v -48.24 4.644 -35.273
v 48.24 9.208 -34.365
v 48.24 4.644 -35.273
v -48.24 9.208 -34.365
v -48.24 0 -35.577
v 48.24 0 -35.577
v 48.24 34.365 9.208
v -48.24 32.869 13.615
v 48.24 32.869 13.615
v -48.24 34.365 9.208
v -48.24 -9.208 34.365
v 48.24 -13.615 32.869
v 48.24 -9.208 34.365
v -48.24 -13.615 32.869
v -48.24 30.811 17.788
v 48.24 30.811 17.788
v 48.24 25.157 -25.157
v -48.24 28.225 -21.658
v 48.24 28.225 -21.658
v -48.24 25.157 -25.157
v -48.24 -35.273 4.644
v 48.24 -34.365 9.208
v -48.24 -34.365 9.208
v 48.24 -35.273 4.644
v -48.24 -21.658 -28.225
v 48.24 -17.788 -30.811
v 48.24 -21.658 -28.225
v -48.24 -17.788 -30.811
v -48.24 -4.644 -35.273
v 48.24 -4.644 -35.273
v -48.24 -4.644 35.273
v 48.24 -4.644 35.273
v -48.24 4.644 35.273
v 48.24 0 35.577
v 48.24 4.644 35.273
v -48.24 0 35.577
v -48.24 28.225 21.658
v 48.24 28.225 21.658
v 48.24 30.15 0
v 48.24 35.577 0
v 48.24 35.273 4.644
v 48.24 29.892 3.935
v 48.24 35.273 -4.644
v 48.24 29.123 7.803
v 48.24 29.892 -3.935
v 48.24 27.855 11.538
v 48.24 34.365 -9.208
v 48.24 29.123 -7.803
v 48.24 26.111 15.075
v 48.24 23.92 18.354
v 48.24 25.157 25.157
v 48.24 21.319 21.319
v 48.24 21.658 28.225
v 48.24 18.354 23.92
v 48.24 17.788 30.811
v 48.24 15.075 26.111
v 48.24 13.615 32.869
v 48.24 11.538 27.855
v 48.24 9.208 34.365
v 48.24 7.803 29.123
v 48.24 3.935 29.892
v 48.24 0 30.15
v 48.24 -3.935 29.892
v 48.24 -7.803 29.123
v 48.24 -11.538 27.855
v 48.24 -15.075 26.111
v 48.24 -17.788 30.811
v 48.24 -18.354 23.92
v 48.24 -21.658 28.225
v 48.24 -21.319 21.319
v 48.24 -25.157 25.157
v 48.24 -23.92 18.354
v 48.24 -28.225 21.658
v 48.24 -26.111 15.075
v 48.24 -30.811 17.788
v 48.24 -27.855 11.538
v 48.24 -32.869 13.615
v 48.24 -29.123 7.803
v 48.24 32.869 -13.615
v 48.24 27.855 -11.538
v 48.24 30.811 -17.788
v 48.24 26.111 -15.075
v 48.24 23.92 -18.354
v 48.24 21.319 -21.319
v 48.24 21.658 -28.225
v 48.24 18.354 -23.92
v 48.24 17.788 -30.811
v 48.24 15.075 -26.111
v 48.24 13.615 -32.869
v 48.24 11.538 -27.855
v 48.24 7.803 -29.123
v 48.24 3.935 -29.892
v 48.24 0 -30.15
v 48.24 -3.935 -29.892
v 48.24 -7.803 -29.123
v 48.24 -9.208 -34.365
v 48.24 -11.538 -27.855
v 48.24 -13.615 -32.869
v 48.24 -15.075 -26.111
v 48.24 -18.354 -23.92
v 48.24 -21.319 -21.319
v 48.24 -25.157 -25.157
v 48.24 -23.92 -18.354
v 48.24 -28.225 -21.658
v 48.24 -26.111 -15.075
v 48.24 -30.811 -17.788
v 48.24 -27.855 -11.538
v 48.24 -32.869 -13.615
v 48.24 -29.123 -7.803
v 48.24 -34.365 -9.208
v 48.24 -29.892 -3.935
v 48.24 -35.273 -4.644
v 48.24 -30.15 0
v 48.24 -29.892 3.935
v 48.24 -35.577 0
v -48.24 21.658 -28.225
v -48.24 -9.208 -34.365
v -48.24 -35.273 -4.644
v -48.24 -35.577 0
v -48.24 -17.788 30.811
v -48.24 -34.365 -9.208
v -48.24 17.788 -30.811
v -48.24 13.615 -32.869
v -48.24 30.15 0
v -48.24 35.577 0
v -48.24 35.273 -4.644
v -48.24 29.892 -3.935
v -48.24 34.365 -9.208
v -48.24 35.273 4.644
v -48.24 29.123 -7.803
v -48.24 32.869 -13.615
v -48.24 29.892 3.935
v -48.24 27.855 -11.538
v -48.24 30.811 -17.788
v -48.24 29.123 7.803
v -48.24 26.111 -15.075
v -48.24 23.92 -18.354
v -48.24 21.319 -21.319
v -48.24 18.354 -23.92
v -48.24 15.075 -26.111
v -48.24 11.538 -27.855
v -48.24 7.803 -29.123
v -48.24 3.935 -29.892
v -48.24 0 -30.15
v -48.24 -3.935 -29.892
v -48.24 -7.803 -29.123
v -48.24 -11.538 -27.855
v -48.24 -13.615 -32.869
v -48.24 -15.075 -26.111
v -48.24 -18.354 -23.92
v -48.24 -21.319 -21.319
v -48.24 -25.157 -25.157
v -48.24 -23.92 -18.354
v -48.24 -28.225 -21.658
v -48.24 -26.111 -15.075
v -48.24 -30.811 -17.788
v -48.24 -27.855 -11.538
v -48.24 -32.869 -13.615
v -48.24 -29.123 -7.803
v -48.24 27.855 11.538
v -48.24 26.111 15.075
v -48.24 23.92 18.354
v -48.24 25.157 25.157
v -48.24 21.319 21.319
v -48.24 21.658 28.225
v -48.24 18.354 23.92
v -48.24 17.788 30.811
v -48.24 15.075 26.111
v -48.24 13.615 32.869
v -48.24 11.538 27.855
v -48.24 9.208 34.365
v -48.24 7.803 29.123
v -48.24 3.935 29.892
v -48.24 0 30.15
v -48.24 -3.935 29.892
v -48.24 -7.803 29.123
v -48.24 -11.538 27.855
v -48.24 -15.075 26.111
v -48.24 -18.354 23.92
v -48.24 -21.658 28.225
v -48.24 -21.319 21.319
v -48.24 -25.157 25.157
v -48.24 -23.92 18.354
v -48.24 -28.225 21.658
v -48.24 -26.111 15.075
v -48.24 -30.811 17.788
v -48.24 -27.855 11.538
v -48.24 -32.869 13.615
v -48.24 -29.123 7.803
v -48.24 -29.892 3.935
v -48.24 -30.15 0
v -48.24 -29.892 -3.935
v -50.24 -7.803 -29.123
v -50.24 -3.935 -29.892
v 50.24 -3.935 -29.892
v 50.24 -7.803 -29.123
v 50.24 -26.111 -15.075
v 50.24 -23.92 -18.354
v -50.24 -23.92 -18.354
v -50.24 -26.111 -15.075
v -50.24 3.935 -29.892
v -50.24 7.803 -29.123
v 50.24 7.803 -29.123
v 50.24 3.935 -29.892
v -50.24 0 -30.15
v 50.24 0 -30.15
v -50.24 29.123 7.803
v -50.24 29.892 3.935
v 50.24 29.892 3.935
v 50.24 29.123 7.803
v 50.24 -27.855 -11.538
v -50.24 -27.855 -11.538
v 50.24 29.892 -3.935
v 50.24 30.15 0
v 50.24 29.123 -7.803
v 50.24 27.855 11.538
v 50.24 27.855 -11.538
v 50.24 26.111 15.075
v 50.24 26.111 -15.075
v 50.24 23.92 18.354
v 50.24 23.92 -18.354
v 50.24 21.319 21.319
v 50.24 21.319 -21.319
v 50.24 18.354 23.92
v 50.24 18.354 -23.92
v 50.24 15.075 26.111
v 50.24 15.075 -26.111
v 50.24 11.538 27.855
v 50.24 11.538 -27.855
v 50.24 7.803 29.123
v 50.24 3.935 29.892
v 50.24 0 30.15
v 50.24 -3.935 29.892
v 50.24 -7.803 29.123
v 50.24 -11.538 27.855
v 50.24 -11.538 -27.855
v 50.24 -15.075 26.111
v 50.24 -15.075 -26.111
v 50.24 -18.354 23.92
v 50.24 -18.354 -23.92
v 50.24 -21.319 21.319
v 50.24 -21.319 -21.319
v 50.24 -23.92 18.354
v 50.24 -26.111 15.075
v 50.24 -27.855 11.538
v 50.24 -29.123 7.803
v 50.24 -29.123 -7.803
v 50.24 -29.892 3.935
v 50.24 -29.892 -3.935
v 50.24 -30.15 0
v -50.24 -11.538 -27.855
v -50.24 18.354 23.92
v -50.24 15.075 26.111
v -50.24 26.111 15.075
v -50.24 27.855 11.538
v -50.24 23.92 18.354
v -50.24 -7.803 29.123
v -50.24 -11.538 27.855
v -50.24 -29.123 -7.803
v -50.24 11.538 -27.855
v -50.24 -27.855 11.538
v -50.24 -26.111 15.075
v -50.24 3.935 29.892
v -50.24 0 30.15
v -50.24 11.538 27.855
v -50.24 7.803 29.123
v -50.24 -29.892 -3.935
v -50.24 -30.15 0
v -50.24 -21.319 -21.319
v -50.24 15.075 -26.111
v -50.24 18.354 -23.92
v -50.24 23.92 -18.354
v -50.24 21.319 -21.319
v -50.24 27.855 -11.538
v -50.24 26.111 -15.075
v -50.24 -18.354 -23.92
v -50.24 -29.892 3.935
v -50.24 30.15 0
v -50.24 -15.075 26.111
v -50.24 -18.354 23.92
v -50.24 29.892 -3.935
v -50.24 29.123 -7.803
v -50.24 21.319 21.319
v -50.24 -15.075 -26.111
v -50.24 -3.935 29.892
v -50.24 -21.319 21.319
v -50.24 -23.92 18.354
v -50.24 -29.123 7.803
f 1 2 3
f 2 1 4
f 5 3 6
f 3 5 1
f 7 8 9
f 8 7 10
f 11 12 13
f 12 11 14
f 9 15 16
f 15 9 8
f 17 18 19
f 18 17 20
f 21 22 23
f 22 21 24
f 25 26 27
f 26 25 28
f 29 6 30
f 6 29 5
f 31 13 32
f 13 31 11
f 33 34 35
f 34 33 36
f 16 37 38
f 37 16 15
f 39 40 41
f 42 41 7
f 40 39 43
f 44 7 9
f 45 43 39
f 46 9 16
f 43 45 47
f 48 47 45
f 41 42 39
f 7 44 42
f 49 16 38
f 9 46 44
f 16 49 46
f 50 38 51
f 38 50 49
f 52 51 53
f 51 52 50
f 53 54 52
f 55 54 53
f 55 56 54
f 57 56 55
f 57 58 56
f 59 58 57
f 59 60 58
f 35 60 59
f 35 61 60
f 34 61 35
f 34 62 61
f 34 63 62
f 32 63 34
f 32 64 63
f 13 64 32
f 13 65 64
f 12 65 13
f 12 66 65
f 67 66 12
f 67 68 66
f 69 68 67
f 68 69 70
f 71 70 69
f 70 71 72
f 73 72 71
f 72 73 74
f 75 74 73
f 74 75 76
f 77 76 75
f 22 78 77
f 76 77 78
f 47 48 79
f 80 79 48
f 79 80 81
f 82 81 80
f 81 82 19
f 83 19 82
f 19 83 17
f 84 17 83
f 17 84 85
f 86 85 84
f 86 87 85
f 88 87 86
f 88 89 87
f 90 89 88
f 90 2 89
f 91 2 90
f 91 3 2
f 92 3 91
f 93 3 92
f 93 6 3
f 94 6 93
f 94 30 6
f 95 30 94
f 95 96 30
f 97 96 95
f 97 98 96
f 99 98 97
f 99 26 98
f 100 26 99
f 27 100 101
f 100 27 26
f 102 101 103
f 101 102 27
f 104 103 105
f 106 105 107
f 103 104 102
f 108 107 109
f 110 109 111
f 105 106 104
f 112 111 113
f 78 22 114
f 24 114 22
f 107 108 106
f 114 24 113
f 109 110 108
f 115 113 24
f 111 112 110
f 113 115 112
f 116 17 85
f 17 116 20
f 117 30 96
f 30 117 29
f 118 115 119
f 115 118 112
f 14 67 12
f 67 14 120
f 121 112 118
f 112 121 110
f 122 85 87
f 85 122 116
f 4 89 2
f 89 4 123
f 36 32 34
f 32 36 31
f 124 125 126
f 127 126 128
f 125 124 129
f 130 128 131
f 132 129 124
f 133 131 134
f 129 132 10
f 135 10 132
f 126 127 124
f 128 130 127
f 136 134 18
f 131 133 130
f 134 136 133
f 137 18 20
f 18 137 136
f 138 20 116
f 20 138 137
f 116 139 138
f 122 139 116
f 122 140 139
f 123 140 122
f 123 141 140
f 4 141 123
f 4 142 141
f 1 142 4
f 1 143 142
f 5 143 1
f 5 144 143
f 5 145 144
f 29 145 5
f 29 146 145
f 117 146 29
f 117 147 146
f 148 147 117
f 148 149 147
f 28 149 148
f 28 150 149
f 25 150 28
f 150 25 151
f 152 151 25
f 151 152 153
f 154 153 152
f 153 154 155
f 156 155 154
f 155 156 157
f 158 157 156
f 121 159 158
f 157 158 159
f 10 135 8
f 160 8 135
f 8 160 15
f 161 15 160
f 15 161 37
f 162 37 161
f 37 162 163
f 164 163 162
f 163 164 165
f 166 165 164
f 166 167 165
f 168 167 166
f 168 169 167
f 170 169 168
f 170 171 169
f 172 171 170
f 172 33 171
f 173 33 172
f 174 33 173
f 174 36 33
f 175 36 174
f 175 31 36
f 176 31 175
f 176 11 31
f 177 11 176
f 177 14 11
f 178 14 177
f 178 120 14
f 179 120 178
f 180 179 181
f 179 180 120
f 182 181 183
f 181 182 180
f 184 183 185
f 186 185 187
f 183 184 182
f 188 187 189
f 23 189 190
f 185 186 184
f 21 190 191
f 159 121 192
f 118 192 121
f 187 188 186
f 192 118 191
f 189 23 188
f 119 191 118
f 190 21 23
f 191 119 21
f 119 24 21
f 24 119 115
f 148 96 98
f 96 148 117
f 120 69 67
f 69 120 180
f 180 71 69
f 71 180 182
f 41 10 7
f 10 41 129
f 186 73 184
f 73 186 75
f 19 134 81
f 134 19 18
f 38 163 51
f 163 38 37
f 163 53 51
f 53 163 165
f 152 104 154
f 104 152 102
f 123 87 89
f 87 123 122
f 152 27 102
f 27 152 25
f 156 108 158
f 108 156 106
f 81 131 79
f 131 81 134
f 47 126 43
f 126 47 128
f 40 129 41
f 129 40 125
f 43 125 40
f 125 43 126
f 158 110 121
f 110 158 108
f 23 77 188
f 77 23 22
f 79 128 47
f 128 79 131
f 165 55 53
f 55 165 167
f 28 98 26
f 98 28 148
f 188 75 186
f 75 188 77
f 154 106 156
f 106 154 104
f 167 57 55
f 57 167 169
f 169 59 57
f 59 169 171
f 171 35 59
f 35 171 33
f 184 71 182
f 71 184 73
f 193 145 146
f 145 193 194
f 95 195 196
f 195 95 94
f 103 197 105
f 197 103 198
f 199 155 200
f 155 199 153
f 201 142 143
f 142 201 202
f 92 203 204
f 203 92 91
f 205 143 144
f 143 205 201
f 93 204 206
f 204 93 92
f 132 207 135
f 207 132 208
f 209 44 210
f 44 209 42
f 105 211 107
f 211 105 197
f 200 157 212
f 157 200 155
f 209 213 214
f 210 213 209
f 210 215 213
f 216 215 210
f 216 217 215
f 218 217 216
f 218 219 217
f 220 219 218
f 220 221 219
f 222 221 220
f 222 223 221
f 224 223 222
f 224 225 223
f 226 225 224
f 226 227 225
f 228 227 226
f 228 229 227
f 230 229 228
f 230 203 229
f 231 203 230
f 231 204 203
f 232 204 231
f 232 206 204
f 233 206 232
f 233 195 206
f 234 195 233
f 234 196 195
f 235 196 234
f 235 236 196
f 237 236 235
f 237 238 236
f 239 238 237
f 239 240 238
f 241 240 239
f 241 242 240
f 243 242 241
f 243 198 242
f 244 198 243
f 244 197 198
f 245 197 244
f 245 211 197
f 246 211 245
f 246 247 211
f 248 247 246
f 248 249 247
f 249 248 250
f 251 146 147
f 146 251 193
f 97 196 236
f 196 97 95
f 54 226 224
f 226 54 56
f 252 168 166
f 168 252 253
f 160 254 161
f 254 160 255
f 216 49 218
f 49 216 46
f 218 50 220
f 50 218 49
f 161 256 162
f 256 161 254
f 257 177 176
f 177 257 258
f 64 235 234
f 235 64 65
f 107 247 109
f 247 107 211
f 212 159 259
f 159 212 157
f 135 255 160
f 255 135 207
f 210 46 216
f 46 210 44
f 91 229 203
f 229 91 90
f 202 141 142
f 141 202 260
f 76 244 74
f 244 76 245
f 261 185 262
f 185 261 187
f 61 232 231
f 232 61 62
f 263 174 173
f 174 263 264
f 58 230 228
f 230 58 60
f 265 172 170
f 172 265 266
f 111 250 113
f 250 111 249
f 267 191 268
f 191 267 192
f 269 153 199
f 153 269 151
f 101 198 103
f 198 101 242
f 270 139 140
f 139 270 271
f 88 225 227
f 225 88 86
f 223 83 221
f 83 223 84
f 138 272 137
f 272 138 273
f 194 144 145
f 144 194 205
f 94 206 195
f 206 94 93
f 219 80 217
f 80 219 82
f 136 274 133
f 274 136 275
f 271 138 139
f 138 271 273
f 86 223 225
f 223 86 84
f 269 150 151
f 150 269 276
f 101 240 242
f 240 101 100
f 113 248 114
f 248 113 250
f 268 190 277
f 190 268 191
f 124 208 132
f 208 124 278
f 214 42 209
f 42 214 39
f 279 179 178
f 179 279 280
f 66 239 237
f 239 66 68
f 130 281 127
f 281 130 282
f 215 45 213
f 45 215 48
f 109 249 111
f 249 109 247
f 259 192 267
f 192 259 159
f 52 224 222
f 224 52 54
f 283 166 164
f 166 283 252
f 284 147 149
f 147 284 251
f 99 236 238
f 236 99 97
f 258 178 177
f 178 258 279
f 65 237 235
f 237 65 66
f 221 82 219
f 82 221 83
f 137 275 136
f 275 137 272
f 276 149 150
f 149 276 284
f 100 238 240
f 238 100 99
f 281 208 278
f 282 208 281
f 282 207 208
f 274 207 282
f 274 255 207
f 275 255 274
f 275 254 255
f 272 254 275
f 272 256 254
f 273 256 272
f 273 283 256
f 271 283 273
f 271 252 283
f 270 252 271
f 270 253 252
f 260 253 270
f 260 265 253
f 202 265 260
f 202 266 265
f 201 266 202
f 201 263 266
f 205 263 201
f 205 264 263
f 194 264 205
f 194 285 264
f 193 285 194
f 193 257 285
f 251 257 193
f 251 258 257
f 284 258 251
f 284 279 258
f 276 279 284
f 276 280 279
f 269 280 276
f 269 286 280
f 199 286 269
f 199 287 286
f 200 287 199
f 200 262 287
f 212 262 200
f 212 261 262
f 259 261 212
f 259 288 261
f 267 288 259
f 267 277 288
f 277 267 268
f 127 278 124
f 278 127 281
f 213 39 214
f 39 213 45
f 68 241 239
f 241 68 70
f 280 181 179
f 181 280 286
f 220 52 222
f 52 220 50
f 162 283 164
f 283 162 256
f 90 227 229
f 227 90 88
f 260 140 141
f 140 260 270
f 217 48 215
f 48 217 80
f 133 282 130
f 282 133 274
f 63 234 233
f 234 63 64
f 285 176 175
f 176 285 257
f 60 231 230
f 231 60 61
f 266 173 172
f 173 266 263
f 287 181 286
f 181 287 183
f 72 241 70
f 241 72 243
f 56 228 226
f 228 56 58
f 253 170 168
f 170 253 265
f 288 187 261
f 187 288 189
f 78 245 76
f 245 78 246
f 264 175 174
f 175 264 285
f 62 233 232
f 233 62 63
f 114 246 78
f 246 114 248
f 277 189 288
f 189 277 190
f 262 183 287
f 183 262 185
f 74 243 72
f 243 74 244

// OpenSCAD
// Auto-generated by scripts/author_from_manifest.py (Phase D.3).
// Source: data/phase_d_manifest.json (sku_intent='victaulic-009-flexible-coupling-2in').
// Do not hand-edit — regenerate from the manifest.
//
// @part victaulic_009_flexible_coupling_2in
// @kind fitting
// @category fitting.coupling
// @display-name "Victaulic FireLock Style 009N Flexible Coupling 2\""
// @mfg victaulic
// @mfg-pn Style_009N_2in
// @listing UL FM
// @price-usd 36.00
// @install-minutes 6
// @crew journeyman
// @param size_in number default=2 label="Size" unit="in"
// @port inlet position=[-0.05,0,0] direction=[-1,0,0] style=grooved size_in=2 role=run_a
// @port outlet position=[0.05,0,0] direction=[1,0,0] style=grooved size_in=2 role=run_b

size_in = 2.0;

function od_mm(nps) =
    nps ==   1  ? 33.4 :
    nps == 1.25 ? 42.2 :
    nps == 1.5  ? 48.3 :
    nps ==   2  ? 60.3 :
    nps == 2.5  ? 73.0 :
    nps ==   3  ? 88.9 :
    nps ==   4  ? 114.3 :
    nps ==   5  ? 141.3 :
    nps ==   6  ? 168.3 :
    nps ==   8  ? 219.1 :
    nps ==  10  ? 273.0 : 60.3;

od = od_mm(size_in);
len_mm = od * 1.6;

rotate([0, 90, 0])
    union() {
        cylinder(h = len_mm, d = od * 1.18, center = true, $fn = 48);
        cylinder(h = len_mm + 4, d = od, center = true, $fn = 48);
    }
